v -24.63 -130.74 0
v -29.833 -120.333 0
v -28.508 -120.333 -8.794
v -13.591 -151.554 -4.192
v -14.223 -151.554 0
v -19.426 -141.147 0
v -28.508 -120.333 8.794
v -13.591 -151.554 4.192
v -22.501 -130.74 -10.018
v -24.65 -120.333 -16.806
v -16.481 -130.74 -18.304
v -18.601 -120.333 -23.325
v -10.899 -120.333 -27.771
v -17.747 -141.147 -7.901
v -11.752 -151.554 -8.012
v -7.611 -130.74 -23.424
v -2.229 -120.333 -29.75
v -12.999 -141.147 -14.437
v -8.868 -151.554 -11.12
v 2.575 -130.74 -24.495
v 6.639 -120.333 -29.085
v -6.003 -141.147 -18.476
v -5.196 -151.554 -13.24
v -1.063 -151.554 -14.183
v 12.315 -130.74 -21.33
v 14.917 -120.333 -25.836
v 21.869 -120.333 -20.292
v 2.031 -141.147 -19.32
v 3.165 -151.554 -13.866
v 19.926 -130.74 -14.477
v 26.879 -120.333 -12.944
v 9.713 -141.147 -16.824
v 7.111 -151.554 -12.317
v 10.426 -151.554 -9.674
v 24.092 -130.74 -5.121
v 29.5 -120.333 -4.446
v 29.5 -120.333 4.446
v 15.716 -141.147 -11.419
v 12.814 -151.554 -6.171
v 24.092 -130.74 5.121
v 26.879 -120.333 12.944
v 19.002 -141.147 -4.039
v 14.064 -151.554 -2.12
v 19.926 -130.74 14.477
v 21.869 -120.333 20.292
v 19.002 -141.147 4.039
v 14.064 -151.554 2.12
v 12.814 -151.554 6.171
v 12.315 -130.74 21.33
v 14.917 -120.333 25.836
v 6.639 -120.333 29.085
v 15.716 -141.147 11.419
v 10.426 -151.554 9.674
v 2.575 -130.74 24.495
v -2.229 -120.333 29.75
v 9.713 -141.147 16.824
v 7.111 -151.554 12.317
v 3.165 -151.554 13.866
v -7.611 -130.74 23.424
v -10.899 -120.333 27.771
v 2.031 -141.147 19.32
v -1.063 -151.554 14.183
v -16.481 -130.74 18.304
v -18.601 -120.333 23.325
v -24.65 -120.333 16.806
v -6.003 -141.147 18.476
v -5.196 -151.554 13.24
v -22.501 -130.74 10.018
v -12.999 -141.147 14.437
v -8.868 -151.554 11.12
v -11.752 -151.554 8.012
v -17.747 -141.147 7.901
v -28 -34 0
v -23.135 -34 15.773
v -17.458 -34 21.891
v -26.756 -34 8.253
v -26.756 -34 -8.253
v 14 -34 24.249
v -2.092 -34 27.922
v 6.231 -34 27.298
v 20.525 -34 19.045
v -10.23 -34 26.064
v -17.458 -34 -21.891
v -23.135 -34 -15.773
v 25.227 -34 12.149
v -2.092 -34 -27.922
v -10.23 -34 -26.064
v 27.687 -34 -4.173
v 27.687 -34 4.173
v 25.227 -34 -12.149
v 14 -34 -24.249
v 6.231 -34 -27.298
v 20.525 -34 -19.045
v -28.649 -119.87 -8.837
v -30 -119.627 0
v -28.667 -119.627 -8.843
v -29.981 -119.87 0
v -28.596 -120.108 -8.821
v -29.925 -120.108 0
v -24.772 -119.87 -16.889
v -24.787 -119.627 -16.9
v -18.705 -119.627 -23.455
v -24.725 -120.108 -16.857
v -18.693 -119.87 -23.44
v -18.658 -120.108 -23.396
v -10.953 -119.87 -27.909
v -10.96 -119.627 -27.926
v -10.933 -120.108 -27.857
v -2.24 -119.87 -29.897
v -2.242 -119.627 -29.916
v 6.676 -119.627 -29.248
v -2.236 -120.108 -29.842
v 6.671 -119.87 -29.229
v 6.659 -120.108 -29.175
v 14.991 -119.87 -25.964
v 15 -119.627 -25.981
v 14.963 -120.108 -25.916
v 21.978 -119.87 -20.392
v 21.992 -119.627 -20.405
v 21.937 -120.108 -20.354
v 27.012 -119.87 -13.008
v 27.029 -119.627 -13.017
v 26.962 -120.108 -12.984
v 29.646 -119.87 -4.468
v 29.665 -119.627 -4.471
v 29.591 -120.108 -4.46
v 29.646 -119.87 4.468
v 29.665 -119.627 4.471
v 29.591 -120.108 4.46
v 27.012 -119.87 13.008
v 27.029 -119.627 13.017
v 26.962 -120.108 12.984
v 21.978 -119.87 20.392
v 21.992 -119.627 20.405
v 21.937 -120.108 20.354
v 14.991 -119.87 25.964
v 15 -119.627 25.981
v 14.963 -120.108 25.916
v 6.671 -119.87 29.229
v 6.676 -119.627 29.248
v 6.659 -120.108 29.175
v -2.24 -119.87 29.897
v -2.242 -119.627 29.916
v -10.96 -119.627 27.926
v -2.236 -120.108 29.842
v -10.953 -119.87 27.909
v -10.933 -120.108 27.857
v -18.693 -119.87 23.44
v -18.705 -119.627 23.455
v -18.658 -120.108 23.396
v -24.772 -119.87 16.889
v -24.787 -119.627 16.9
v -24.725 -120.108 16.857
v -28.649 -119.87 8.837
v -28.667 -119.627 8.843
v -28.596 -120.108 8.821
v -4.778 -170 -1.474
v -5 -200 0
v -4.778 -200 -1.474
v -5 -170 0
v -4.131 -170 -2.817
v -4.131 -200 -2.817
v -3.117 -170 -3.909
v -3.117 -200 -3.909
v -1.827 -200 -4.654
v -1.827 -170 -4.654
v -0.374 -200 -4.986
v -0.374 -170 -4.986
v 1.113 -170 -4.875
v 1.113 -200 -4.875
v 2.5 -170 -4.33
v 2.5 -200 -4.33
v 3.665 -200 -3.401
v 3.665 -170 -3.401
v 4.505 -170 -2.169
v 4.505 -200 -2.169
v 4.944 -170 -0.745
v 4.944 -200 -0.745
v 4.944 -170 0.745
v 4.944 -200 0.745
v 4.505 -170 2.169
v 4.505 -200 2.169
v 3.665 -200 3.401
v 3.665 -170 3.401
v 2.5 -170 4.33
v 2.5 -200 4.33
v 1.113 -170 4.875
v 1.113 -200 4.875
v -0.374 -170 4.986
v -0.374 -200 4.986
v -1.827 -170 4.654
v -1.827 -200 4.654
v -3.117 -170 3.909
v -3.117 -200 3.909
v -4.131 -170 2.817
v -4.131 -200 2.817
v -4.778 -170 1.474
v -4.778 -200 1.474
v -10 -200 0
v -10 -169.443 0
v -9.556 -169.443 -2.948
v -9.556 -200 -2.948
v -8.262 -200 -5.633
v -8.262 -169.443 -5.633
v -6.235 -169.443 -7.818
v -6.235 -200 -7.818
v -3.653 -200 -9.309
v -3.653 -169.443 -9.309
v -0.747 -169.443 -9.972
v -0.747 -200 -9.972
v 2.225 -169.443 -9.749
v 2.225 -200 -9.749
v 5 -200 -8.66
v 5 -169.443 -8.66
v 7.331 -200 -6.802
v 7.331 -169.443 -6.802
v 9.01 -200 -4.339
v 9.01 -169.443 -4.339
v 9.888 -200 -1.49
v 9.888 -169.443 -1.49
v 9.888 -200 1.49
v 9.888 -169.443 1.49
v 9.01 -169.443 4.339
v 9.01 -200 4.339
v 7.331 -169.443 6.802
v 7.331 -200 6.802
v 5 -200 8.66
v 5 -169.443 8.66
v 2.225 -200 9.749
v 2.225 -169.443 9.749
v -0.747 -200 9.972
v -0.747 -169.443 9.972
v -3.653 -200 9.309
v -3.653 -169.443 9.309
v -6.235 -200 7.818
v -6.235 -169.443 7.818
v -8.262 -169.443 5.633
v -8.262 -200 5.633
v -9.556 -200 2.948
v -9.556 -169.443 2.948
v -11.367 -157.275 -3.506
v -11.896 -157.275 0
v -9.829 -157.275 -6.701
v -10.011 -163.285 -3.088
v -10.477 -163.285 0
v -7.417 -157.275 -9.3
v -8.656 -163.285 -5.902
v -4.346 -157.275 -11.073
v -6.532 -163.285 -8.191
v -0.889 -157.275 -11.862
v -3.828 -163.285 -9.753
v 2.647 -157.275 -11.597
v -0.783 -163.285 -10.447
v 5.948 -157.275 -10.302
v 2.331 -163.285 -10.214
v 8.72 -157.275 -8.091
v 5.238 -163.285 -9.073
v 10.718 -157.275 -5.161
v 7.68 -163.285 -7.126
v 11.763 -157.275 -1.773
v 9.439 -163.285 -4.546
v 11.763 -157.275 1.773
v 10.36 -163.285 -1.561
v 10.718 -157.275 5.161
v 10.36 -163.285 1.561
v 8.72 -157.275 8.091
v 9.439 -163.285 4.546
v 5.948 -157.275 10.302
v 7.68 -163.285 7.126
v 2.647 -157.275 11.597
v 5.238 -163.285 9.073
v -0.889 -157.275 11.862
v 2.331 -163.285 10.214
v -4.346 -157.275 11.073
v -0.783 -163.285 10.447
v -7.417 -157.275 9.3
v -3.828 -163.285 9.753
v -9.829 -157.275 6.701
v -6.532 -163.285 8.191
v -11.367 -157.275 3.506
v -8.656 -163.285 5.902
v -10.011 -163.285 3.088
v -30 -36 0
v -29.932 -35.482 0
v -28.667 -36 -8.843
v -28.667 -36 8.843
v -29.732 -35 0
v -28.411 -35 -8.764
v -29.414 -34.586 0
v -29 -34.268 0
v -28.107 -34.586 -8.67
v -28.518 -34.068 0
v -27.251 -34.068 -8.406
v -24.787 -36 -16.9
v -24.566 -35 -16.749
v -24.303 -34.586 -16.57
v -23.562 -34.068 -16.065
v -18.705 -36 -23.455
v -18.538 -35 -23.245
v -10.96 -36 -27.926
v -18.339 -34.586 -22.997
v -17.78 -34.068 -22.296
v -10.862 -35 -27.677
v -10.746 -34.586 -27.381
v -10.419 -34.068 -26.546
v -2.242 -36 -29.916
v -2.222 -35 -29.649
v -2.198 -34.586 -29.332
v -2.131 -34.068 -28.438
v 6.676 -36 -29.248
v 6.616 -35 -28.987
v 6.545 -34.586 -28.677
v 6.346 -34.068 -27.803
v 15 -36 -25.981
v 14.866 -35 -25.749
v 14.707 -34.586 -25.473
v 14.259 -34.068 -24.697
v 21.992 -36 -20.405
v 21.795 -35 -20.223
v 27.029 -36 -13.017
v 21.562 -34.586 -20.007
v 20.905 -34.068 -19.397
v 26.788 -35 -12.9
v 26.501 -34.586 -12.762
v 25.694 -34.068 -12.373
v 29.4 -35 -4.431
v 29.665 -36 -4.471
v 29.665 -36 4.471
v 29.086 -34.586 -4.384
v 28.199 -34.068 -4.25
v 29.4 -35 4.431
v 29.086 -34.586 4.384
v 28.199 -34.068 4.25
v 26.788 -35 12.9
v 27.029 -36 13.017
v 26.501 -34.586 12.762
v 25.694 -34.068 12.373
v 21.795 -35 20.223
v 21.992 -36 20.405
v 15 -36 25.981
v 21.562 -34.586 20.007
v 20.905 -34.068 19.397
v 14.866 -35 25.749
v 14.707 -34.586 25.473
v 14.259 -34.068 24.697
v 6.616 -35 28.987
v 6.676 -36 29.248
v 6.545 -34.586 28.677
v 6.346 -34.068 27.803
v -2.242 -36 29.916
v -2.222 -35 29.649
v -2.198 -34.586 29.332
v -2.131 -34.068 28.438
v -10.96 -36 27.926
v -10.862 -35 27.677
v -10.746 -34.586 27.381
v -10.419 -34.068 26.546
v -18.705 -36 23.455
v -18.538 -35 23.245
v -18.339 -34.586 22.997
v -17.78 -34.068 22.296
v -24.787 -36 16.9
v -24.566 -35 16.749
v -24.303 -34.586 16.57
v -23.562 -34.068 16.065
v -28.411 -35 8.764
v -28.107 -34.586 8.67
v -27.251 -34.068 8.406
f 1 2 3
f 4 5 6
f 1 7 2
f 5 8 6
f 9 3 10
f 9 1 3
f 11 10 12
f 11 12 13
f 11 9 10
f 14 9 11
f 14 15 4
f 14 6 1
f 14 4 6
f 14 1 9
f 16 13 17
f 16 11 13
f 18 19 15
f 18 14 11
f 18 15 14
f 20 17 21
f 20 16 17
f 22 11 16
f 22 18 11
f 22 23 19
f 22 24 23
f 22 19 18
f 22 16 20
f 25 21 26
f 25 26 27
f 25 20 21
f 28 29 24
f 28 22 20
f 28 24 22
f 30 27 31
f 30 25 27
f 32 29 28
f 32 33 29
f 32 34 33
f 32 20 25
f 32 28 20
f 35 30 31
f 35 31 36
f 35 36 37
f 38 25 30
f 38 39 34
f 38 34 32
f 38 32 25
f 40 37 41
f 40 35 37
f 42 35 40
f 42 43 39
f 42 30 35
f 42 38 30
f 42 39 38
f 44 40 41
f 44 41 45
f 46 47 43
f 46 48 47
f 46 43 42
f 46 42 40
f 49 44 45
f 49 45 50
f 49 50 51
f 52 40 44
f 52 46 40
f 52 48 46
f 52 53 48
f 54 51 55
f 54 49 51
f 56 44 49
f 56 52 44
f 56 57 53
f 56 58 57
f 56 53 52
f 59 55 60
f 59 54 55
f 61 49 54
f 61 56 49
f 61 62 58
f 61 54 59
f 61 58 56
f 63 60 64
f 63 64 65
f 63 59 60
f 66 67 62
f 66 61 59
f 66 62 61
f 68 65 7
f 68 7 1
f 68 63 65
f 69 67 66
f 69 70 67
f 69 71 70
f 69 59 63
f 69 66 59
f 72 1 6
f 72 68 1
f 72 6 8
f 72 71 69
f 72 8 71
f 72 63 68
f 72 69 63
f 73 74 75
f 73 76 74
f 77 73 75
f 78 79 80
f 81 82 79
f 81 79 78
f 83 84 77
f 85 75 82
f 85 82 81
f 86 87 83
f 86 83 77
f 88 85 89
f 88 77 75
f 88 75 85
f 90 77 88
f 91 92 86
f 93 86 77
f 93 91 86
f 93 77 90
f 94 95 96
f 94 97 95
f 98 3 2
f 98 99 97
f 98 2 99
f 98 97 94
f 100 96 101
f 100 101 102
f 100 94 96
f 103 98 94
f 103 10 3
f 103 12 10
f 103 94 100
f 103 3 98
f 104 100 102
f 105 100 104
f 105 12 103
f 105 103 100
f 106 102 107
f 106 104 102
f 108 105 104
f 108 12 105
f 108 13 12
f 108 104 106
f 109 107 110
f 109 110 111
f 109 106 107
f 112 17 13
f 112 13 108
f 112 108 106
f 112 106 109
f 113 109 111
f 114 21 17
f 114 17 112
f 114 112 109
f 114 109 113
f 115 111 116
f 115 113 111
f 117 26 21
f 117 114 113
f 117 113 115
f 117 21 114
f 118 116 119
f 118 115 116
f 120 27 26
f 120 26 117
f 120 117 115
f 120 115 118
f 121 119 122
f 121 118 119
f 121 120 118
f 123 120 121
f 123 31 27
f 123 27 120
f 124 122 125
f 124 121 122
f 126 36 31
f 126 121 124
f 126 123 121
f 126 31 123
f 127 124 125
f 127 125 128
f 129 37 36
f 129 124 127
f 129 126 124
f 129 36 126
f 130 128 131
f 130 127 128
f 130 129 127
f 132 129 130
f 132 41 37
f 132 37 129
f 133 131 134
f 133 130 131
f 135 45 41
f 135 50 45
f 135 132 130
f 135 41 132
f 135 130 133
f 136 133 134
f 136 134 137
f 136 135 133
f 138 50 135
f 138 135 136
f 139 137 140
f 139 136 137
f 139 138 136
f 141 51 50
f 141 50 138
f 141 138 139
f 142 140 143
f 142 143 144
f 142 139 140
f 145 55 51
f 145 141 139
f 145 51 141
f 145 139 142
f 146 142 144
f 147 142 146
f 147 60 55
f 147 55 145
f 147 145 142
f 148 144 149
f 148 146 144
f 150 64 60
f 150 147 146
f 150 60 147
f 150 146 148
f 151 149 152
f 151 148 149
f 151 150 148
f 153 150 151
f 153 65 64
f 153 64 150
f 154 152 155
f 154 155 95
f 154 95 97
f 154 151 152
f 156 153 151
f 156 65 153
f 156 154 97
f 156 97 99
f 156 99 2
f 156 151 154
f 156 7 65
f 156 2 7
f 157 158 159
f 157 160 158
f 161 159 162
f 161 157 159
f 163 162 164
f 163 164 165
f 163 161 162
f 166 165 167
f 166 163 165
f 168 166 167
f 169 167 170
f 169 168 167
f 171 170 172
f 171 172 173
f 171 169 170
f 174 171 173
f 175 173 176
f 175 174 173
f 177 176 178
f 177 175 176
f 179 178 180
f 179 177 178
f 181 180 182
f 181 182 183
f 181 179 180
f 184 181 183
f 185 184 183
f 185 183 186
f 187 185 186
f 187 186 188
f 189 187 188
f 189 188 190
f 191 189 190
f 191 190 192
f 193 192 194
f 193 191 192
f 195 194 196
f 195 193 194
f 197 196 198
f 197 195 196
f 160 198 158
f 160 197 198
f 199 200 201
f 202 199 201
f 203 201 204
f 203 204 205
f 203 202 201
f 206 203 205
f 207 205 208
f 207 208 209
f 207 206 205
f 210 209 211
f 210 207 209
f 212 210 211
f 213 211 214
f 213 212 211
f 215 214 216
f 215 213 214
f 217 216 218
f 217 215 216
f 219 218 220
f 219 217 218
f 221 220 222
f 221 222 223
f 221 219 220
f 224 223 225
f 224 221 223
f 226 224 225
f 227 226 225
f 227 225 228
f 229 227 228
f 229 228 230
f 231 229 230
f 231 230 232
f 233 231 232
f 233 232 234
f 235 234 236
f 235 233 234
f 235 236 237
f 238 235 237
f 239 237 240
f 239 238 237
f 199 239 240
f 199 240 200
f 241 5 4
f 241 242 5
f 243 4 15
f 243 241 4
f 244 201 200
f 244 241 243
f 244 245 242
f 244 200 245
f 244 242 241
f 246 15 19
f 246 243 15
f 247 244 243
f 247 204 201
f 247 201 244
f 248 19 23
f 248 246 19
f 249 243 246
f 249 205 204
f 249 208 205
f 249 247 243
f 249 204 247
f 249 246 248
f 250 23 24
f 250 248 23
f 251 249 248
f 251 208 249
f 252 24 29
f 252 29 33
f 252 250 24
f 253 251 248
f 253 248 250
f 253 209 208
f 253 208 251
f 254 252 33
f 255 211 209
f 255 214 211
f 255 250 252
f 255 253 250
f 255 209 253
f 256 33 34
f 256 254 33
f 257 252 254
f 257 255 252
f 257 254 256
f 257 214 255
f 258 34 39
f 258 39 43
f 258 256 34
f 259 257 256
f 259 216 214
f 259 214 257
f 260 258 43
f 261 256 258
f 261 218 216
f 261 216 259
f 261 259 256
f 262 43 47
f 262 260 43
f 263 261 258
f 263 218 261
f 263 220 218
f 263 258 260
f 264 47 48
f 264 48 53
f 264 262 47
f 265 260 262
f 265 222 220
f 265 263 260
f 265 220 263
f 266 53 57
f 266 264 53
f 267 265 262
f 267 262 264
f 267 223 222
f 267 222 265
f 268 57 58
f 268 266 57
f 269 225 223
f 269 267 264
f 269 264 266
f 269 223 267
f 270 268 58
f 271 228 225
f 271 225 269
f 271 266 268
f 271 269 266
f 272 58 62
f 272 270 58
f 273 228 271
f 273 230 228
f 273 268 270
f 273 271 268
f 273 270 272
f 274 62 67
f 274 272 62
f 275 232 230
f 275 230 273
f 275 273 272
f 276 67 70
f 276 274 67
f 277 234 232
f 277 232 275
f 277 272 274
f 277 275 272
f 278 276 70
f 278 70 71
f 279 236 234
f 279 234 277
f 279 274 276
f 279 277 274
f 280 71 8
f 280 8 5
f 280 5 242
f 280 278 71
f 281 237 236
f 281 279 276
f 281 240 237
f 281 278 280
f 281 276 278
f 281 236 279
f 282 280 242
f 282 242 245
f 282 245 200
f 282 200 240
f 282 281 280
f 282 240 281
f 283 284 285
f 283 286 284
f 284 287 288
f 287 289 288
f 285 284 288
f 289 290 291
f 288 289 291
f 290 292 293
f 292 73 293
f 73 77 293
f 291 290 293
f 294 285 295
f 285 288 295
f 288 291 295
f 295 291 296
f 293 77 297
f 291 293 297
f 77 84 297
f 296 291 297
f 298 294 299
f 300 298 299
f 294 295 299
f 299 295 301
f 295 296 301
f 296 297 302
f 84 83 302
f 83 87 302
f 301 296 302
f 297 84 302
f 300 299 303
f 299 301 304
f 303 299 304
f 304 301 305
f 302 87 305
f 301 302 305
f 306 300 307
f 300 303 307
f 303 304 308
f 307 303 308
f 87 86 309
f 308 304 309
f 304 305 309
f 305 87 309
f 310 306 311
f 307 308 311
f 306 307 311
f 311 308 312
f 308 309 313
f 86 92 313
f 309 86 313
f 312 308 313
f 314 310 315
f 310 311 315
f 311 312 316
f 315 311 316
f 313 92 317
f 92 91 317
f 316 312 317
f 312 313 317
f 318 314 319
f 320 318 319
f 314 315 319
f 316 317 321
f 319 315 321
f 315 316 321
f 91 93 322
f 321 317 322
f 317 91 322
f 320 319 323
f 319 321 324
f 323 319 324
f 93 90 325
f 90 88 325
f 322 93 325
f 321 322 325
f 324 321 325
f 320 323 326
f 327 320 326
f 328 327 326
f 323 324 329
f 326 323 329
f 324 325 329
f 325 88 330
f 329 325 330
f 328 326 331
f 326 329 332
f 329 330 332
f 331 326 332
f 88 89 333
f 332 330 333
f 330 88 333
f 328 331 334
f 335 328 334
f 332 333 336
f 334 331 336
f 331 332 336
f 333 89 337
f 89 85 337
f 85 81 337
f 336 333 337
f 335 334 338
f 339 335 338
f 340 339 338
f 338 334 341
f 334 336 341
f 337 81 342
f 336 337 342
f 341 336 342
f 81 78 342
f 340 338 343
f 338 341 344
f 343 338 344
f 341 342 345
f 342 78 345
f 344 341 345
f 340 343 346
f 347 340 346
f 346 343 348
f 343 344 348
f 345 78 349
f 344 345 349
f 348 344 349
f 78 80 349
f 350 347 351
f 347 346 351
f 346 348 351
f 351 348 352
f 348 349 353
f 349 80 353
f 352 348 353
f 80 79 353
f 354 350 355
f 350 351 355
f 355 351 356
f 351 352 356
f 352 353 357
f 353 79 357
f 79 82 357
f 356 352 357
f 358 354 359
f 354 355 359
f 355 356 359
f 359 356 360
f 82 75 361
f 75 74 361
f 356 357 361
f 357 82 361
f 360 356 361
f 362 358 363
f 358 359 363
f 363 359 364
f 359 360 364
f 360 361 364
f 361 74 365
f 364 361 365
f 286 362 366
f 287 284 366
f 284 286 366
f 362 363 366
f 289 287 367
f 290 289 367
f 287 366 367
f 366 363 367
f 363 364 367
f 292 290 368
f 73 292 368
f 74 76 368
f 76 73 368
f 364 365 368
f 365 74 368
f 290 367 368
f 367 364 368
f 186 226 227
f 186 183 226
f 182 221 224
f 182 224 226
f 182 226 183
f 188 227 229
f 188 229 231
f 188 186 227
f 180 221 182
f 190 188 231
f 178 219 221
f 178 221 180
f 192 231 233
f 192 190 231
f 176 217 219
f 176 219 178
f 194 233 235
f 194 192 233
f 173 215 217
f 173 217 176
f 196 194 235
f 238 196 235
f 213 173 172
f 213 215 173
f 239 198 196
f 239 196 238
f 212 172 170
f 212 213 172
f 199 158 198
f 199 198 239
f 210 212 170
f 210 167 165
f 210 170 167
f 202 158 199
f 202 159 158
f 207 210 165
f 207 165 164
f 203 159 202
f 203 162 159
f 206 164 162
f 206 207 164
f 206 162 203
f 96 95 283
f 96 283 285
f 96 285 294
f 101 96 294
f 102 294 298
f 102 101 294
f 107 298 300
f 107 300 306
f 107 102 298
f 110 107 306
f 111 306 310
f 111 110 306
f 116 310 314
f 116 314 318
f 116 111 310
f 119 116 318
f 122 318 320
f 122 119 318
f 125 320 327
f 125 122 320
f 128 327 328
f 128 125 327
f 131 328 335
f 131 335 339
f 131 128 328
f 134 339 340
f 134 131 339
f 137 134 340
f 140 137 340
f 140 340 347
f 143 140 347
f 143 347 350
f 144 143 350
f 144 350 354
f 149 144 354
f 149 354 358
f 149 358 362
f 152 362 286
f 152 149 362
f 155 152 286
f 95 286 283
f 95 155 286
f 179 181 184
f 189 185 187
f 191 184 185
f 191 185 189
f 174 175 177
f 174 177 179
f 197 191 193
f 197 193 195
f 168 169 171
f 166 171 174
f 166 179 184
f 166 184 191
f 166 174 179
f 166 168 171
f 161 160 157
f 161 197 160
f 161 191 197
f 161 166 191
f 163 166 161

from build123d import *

# Parameters (mm, degrees)
SKETCH1_R          = 30.591778674
CUT_EXTRUDE1_DEPTH = 34
FILLET1_R          = 2


with BuildPart() as part:
    # Esquisse1 → Révolution1 (revolve)
    with BuildSketch(Plane.XY, mode=Mode.PRIVATE) as r_volution1_sk:
        with BuildLine():
            Line((0, 0), (28, 0))
            ThreePointArc((28, 0), (29.414213562, -0.585786438), (30, -2))
            Line((30, -2), (30, -119.627445758))
            ThreePointArc((30, -119.627445758), (29.957782489, -119.990033798), (29.833388678, -120.333222644))
            Line((29.833388678, -120.333222644), (14.22291236, -151.55417528))
            ThreePointArc((14.22291236, -151.55417528), (11.070040421, -160.252602278), (10, -169.4427191))
            Line((10, -169.4427191), (10, -200))
            Line((10, -200), (5, -200))
            Line((5, -200), (5, -170))
            Line((5, -170), (0, -170))
            Line((0, -170), (0, 0))
        make_face()
    revolve(r_volution1_sk.sketch.rotate(Axis((0, 0, 0), (0, -1, 0)), 180), axis=Axis((0, 0, 0), (0, -1, 0)))

    # Sketch1 → Cut-Extrude1 (cut)
    with BuildSketch(Plane(origin=(0, 0, 0), x_dir=(1, 0, 0), z_dir=(0, 1, 0))):
        Circle(SKETCH1_R)
    extrude(amount=-CUT_EXTRUDE1_DEPTH, mode=Mode.SUBTRACT)

    # Fillet1
    fillet1_edges = [part.edges().sort_by_distance(p)[0] for p in [
        (30, -34, 0),
    ]]
    fillet(fillet1_edges, radius=FILLET1_R)


solid = part.part
